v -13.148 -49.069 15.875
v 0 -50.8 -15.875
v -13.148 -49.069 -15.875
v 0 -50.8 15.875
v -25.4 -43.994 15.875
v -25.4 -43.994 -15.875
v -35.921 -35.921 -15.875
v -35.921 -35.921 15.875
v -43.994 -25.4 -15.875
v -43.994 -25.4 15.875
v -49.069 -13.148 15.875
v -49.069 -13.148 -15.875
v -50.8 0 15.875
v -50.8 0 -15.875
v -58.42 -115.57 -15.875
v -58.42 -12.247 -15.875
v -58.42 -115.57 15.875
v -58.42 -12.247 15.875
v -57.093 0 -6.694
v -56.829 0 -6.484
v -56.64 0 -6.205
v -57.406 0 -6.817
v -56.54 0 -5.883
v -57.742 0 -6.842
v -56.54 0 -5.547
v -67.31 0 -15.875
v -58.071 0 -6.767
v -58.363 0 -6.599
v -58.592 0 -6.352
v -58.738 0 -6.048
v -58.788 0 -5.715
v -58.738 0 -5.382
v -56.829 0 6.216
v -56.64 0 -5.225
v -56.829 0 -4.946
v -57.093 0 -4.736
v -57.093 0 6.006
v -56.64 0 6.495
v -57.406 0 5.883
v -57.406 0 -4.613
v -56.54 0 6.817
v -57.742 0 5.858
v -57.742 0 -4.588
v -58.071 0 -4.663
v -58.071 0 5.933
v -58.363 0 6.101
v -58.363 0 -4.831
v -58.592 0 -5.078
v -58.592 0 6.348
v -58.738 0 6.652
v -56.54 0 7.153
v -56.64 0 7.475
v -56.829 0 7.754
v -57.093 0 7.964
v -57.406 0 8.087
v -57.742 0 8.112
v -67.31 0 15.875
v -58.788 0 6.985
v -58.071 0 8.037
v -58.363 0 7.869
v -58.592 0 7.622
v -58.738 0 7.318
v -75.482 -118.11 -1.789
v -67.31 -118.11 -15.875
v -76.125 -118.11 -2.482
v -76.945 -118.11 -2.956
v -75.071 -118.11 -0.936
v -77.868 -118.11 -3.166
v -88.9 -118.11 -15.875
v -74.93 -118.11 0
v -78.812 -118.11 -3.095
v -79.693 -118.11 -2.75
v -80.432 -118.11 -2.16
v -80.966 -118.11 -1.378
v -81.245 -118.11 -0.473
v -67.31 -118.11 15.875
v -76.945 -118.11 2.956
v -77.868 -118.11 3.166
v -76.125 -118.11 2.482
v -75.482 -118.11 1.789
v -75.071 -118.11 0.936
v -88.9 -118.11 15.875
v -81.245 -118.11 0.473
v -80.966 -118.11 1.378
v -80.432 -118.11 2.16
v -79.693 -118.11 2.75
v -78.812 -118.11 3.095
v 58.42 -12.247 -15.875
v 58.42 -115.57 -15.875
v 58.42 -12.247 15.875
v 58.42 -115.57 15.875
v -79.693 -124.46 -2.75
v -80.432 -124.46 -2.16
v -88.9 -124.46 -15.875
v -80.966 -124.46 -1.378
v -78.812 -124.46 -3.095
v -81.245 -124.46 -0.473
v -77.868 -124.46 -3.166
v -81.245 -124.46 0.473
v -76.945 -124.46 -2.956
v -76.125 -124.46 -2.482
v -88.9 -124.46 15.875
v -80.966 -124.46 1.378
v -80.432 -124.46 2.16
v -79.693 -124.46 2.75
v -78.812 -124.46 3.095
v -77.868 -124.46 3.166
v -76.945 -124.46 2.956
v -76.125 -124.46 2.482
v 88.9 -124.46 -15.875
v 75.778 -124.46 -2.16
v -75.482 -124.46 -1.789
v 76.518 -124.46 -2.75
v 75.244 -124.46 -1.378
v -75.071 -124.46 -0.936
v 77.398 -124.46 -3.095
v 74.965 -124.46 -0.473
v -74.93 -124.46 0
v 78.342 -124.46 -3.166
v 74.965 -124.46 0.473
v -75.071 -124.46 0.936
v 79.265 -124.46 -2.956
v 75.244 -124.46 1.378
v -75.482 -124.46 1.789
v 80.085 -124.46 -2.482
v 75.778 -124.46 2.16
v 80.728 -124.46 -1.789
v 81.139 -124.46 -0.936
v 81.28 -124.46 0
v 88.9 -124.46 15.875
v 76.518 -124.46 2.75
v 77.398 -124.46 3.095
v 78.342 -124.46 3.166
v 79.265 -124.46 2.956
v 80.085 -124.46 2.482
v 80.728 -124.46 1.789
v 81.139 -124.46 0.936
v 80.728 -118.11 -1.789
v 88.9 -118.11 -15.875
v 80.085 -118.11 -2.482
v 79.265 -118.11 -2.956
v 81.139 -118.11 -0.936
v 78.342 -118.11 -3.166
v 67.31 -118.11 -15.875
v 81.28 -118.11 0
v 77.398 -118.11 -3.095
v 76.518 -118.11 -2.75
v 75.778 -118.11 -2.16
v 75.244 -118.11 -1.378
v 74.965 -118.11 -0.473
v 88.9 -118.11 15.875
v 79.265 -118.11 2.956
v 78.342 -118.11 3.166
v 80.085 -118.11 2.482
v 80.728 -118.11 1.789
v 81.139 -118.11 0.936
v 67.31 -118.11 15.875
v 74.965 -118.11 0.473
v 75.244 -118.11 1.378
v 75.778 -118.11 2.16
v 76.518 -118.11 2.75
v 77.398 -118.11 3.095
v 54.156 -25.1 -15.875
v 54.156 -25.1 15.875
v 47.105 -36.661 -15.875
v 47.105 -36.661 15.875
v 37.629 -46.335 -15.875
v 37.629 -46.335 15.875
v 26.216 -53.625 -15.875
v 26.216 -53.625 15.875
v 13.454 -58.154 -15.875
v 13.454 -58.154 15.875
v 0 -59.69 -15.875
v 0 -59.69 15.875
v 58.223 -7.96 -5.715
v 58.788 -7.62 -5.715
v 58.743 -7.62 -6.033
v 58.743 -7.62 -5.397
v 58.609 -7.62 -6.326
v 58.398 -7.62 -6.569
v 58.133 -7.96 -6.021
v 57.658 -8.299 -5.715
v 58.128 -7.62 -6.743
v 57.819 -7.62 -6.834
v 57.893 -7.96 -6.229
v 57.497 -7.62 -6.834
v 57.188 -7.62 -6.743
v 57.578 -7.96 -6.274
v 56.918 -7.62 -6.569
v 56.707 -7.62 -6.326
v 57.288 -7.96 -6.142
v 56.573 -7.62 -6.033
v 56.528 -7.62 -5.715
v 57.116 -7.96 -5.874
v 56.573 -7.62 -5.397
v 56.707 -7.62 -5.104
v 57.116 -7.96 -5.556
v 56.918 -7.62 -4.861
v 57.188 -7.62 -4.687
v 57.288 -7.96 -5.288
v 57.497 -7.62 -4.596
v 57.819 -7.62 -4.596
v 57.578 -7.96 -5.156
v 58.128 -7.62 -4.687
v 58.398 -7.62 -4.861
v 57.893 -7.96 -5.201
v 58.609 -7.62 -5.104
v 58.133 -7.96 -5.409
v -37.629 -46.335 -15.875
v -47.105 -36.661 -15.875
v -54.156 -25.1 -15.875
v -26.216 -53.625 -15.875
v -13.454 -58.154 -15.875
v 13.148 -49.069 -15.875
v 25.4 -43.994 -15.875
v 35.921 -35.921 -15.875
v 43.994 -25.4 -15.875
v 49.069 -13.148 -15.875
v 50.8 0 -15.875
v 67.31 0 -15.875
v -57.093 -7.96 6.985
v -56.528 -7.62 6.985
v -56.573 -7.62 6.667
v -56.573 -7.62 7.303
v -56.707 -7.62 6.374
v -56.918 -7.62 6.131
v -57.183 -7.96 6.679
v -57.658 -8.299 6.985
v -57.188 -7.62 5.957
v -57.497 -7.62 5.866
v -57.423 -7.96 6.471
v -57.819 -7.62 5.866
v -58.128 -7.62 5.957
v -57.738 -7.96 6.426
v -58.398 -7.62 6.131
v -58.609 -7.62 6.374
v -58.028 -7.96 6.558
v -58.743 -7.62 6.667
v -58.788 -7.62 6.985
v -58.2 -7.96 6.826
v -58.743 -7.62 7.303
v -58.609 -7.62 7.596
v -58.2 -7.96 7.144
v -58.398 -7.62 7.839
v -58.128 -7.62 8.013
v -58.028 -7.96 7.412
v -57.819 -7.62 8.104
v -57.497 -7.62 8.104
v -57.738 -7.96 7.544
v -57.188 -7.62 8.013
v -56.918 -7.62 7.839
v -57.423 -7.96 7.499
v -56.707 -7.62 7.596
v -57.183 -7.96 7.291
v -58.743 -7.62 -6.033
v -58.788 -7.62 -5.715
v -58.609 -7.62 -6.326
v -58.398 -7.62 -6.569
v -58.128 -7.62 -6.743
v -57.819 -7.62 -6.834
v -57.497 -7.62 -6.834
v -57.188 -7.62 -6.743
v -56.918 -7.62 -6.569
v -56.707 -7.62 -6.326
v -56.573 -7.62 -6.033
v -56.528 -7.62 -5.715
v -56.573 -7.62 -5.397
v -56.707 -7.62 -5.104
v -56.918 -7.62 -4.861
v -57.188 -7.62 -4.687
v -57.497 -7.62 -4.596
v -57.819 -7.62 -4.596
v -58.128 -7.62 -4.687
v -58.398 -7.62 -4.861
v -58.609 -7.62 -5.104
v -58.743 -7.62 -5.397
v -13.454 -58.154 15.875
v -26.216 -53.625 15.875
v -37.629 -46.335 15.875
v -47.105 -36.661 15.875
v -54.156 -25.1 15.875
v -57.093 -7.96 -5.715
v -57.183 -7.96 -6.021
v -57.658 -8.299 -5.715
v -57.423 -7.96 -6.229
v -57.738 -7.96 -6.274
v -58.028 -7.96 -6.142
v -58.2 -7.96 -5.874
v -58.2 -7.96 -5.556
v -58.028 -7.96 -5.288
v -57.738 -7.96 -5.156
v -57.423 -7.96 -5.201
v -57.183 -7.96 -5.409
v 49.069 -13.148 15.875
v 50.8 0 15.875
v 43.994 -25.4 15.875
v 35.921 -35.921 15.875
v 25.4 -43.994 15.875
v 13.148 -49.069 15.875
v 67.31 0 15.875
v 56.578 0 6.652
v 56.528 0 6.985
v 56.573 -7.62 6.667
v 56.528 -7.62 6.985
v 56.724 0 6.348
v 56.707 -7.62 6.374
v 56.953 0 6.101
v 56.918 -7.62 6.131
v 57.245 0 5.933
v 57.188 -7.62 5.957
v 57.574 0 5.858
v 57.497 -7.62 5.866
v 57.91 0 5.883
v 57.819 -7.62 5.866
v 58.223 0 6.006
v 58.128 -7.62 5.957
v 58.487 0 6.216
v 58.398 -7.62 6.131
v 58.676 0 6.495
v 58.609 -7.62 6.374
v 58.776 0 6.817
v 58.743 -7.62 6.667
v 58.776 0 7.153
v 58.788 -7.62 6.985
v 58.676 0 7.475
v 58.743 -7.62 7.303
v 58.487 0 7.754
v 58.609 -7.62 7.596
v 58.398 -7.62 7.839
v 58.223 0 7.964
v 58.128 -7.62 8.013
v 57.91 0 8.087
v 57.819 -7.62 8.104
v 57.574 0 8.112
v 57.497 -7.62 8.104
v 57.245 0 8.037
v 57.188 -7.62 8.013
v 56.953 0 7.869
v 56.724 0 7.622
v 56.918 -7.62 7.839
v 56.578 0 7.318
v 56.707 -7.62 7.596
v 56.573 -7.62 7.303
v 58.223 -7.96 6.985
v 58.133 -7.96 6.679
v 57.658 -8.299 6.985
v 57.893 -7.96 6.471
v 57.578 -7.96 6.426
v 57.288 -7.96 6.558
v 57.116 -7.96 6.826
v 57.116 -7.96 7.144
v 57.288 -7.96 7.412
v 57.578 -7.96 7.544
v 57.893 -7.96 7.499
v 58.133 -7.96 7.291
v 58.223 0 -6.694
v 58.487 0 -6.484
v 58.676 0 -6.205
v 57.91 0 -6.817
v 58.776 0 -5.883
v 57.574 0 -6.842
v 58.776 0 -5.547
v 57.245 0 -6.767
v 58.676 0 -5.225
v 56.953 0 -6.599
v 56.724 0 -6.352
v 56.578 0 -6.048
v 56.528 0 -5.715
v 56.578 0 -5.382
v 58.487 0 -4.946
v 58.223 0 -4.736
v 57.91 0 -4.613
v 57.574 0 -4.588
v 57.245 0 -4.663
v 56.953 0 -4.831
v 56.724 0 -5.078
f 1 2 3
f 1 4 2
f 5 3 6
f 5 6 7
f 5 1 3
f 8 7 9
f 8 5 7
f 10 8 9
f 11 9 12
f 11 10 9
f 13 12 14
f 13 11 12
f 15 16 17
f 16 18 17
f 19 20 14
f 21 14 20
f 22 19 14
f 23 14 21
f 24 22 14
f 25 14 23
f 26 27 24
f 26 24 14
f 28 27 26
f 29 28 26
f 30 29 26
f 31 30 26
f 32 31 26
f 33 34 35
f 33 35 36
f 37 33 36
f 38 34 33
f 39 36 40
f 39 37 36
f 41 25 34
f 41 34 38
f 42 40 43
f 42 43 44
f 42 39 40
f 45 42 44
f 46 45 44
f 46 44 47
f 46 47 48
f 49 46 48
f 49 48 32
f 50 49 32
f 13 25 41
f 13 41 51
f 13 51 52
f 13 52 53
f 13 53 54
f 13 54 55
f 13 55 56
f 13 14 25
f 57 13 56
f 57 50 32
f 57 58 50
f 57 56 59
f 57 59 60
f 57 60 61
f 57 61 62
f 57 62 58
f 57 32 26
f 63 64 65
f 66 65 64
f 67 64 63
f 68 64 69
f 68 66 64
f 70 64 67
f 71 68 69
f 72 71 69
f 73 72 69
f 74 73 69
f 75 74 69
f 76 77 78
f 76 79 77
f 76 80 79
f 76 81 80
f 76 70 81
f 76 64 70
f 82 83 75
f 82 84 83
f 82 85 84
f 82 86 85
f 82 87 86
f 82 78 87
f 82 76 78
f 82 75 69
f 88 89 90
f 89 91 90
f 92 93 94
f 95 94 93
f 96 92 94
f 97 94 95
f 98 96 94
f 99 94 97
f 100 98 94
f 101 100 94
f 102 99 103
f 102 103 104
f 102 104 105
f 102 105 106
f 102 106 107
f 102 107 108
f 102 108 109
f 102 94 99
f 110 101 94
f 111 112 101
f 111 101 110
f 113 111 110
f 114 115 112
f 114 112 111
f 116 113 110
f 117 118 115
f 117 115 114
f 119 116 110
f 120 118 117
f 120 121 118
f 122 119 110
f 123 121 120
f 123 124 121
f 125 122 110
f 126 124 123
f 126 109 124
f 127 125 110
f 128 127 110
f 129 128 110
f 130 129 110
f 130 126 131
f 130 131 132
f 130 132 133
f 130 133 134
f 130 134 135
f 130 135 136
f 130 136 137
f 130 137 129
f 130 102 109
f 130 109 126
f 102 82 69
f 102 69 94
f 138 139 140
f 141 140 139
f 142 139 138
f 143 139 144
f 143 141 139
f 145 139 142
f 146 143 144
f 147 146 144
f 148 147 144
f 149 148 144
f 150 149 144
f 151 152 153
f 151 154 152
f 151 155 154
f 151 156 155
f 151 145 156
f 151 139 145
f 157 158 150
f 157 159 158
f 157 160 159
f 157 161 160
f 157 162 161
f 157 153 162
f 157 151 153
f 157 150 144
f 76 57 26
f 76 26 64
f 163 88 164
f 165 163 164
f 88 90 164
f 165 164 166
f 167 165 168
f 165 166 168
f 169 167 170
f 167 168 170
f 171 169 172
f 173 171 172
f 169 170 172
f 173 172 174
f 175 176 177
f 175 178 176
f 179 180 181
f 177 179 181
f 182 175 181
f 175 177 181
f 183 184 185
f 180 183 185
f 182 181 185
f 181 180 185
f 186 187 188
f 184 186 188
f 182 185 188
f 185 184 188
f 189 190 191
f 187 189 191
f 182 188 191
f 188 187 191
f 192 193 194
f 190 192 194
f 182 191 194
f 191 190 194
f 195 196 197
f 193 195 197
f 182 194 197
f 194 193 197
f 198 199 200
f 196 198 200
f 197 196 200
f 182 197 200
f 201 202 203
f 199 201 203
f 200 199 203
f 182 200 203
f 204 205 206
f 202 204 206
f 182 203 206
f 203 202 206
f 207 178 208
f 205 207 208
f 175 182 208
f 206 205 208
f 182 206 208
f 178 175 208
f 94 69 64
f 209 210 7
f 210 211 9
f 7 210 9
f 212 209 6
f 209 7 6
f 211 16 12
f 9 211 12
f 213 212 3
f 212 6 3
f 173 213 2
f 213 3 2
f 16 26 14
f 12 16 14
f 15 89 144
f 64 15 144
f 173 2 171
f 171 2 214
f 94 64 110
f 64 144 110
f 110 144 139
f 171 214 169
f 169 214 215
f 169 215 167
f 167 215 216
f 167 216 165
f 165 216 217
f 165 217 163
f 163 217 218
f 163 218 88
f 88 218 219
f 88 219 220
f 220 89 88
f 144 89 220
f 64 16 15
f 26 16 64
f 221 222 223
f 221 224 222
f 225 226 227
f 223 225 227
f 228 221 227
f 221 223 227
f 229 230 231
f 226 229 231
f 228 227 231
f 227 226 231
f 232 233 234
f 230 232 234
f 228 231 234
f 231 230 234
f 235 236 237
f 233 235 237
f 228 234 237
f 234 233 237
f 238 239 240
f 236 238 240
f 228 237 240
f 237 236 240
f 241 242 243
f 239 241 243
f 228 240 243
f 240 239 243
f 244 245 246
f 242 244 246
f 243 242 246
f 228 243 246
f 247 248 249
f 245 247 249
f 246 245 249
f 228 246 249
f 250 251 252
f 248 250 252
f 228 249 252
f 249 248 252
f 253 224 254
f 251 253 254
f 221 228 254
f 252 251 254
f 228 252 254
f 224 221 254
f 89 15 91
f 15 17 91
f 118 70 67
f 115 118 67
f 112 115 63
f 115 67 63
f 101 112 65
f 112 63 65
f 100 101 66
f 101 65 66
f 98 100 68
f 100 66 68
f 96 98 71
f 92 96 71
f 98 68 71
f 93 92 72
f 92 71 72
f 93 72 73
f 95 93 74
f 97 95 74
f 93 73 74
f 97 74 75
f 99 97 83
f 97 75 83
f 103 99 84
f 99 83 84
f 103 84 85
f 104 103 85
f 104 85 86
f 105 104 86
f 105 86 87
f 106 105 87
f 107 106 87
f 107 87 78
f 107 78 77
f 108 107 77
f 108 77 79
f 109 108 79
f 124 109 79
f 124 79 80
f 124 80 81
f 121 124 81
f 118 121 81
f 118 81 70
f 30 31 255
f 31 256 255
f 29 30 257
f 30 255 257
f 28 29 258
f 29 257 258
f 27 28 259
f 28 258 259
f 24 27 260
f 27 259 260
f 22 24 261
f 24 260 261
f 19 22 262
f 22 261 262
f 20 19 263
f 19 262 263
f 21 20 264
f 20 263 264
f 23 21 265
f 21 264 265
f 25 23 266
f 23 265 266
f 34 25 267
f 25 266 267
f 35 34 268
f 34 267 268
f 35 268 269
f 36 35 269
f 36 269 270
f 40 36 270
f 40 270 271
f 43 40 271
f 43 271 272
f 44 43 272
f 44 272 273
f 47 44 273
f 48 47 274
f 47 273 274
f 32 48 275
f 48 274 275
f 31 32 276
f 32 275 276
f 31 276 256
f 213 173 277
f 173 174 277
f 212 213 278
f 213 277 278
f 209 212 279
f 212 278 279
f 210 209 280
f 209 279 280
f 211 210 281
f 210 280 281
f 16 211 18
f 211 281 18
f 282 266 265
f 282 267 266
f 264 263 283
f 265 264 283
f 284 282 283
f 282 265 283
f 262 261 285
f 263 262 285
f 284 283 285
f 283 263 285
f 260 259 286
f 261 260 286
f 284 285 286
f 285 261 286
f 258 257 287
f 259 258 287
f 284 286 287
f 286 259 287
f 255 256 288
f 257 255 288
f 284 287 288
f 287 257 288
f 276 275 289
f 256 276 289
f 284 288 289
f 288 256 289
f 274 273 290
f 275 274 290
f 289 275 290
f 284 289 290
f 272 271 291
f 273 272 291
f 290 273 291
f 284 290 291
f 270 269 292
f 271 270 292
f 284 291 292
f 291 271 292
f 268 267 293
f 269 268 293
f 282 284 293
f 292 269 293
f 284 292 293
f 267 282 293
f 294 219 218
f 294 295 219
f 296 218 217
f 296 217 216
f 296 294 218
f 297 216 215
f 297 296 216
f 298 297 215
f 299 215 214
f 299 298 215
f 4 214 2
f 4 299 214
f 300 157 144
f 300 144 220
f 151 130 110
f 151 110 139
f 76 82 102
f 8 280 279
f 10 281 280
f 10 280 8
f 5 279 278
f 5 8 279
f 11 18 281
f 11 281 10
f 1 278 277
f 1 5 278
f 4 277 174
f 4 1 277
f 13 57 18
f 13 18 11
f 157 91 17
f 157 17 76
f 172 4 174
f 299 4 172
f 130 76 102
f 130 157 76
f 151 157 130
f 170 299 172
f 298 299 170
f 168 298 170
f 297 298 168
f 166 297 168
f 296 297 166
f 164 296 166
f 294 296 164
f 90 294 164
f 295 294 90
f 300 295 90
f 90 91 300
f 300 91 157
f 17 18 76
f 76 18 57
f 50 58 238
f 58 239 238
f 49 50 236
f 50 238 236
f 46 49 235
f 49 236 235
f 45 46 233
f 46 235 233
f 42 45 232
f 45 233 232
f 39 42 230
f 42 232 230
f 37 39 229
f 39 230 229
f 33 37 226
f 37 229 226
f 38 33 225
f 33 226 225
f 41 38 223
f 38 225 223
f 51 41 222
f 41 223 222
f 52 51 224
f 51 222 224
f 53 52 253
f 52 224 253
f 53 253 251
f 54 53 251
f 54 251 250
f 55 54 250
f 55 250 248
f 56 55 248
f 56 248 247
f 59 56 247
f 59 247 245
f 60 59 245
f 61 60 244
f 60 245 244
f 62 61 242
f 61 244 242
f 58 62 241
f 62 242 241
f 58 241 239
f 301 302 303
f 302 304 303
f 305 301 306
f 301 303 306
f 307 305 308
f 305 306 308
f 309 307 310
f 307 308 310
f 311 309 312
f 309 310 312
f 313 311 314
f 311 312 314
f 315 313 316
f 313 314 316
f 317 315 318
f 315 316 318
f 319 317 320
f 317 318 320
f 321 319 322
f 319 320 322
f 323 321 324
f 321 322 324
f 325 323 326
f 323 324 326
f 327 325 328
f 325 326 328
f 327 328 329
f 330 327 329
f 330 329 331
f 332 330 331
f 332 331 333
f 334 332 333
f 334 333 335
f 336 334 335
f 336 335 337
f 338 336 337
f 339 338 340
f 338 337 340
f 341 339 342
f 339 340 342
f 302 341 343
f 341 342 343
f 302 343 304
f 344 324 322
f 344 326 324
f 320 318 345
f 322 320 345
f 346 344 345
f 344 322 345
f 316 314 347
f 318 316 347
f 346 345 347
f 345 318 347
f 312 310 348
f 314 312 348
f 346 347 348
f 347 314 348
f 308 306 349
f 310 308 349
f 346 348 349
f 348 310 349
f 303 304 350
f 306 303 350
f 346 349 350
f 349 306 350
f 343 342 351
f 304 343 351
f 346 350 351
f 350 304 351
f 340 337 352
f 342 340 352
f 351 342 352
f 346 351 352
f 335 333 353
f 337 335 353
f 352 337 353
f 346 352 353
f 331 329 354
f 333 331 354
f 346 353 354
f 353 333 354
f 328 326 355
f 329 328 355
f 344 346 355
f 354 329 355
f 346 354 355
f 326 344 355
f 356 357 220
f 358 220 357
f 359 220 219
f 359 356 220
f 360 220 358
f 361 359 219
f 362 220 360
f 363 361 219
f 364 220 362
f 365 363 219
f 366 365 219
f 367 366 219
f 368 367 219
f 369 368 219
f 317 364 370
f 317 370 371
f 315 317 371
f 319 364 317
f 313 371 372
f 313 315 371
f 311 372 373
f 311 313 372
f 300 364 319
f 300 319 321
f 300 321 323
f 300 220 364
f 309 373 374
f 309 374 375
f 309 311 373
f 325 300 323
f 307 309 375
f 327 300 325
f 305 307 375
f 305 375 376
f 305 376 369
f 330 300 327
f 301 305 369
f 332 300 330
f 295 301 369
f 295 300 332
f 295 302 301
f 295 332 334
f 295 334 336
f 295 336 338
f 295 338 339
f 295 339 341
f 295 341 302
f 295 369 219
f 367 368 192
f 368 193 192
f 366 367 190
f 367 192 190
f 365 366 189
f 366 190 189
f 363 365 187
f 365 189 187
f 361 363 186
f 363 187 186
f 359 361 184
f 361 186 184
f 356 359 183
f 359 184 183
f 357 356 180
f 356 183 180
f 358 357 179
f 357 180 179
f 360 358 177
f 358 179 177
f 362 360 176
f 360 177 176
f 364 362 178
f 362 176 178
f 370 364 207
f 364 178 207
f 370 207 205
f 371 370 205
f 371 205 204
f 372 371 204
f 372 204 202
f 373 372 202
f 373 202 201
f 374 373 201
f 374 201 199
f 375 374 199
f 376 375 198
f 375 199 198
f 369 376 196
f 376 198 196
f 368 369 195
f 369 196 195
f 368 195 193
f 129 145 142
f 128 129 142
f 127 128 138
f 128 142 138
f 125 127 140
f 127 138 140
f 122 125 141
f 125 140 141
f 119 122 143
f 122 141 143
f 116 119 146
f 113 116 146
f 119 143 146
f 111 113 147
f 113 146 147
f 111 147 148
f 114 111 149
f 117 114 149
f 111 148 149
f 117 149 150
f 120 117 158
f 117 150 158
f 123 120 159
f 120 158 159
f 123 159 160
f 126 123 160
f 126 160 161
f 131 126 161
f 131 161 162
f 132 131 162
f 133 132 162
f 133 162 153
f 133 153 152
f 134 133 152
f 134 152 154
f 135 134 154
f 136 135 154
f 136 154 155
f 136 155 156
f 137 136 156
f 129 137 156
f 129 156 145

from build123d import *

# Parameters (mm, degrees)
BOSS_EXTRUDE1_DEPTH       = 15.875
SHELL1_T                  = -8.89
SKETCH2_R                 = 3.175
CUT_EXTRUDE1_DEPTH        = 7.35
F_4_40_TAPPED_HOLE1_D     = 2.2606
F_4_40_TAPPED_HOLE1_DEPTH = 7.62
F_4_40_TAPPED_HOLE1_TIP   = 0.679153


with BuildPart() as part:
    # Sketch1 → Boss-Extrude1 (new body, symmetric)
    with BuildSketch(Plane.XY):
        with BuildLine():
            ThreePointArc((0, -50.8), (-35.921024, -35.921024), (-50.8, 0))
            Line((-50.8, 0), (-67.31, 0))
            Line((-67.31, 0), (-67.31, -118.11))
            Line((-67.31, -118.11), (-88.9, -118.11))
            Line((-88.9, -118.11), (-88.9, -124.46))
            Line((-88.9, -124.46), (0, -124.46))
            Line((0, -124.46), (0, -50.8))
        make_face()
        with BuildLine():
            ThreePointArc((50.8, 0), (35.921024, -35.921024), (0, -50.8))
            Line((0, -50.8), (0, -124.46))
            Line((0, -124.46), (88.9, -124.46))
            Line((88.9, -124.46), (88.9, -118.11))
            Line((88.9, -118.11), (67.31, -118.11))
            Line((67.31, -118.11), (67.31, 0))
            Line((67.31, 0), (50.8, 0))
        make_face()
    extrude(amount=BOSS_EXTRUDE1_DEPTH, both=True)

    # Shell1
    shell1_openings = [part.faces().sort_by_distance(p)[0] for p in [
        (0, -77.216, 15.875),
        (0, -77.216, -15.875),
    ]]
    offset(amount=SHELL1_T, openings=shell1_openings)

    # Sketch2 → Cut-Extrude1 (cut, through all)
    with BuildSketch(Plane(origin=(0, -118.11, 0), x_dir=(1, 0, 0), z_dir=(0, 1, 0))):
        with Locations((-78.105, 0)):
            Circle(SKETCH2_R)
        with Locations((78.105, 0)):
            Circle(SKETCH2_R)
    extrude(amount=-CUT_EXTRUDE1_DEPTH, mode=Mode.SUBTRACT)

    # #4-40 Tapped Hole1
    with Locations(Plane(origin=(0, 0, 0), x_dir=(1, 0, 0), z_dir=(0, 1, 0))):
        with Locations((-57.658, 5.715), (-57.658, -6.985), (57.658, -6.985), (57.658, 5.715)):
            Hole(F_4_40_TAPPED_HOLE1_D / 2, depth=F_4_40_TAPPED_HOLE1_DEPTH)
            with Locations((0, 0, -(F_4_40_TAPPED_HOLE1_DEPTH + F_4_40_TAPPED_HOLE1_TIP / 2))):  # 118° drill point
                Cone(0, F_4_40_TAPPED_HOLE1_D / 2, F_4_40_TAPPED_HOLE1_TIP, mode=Mode.SUBTRACT)


solid = part.part
